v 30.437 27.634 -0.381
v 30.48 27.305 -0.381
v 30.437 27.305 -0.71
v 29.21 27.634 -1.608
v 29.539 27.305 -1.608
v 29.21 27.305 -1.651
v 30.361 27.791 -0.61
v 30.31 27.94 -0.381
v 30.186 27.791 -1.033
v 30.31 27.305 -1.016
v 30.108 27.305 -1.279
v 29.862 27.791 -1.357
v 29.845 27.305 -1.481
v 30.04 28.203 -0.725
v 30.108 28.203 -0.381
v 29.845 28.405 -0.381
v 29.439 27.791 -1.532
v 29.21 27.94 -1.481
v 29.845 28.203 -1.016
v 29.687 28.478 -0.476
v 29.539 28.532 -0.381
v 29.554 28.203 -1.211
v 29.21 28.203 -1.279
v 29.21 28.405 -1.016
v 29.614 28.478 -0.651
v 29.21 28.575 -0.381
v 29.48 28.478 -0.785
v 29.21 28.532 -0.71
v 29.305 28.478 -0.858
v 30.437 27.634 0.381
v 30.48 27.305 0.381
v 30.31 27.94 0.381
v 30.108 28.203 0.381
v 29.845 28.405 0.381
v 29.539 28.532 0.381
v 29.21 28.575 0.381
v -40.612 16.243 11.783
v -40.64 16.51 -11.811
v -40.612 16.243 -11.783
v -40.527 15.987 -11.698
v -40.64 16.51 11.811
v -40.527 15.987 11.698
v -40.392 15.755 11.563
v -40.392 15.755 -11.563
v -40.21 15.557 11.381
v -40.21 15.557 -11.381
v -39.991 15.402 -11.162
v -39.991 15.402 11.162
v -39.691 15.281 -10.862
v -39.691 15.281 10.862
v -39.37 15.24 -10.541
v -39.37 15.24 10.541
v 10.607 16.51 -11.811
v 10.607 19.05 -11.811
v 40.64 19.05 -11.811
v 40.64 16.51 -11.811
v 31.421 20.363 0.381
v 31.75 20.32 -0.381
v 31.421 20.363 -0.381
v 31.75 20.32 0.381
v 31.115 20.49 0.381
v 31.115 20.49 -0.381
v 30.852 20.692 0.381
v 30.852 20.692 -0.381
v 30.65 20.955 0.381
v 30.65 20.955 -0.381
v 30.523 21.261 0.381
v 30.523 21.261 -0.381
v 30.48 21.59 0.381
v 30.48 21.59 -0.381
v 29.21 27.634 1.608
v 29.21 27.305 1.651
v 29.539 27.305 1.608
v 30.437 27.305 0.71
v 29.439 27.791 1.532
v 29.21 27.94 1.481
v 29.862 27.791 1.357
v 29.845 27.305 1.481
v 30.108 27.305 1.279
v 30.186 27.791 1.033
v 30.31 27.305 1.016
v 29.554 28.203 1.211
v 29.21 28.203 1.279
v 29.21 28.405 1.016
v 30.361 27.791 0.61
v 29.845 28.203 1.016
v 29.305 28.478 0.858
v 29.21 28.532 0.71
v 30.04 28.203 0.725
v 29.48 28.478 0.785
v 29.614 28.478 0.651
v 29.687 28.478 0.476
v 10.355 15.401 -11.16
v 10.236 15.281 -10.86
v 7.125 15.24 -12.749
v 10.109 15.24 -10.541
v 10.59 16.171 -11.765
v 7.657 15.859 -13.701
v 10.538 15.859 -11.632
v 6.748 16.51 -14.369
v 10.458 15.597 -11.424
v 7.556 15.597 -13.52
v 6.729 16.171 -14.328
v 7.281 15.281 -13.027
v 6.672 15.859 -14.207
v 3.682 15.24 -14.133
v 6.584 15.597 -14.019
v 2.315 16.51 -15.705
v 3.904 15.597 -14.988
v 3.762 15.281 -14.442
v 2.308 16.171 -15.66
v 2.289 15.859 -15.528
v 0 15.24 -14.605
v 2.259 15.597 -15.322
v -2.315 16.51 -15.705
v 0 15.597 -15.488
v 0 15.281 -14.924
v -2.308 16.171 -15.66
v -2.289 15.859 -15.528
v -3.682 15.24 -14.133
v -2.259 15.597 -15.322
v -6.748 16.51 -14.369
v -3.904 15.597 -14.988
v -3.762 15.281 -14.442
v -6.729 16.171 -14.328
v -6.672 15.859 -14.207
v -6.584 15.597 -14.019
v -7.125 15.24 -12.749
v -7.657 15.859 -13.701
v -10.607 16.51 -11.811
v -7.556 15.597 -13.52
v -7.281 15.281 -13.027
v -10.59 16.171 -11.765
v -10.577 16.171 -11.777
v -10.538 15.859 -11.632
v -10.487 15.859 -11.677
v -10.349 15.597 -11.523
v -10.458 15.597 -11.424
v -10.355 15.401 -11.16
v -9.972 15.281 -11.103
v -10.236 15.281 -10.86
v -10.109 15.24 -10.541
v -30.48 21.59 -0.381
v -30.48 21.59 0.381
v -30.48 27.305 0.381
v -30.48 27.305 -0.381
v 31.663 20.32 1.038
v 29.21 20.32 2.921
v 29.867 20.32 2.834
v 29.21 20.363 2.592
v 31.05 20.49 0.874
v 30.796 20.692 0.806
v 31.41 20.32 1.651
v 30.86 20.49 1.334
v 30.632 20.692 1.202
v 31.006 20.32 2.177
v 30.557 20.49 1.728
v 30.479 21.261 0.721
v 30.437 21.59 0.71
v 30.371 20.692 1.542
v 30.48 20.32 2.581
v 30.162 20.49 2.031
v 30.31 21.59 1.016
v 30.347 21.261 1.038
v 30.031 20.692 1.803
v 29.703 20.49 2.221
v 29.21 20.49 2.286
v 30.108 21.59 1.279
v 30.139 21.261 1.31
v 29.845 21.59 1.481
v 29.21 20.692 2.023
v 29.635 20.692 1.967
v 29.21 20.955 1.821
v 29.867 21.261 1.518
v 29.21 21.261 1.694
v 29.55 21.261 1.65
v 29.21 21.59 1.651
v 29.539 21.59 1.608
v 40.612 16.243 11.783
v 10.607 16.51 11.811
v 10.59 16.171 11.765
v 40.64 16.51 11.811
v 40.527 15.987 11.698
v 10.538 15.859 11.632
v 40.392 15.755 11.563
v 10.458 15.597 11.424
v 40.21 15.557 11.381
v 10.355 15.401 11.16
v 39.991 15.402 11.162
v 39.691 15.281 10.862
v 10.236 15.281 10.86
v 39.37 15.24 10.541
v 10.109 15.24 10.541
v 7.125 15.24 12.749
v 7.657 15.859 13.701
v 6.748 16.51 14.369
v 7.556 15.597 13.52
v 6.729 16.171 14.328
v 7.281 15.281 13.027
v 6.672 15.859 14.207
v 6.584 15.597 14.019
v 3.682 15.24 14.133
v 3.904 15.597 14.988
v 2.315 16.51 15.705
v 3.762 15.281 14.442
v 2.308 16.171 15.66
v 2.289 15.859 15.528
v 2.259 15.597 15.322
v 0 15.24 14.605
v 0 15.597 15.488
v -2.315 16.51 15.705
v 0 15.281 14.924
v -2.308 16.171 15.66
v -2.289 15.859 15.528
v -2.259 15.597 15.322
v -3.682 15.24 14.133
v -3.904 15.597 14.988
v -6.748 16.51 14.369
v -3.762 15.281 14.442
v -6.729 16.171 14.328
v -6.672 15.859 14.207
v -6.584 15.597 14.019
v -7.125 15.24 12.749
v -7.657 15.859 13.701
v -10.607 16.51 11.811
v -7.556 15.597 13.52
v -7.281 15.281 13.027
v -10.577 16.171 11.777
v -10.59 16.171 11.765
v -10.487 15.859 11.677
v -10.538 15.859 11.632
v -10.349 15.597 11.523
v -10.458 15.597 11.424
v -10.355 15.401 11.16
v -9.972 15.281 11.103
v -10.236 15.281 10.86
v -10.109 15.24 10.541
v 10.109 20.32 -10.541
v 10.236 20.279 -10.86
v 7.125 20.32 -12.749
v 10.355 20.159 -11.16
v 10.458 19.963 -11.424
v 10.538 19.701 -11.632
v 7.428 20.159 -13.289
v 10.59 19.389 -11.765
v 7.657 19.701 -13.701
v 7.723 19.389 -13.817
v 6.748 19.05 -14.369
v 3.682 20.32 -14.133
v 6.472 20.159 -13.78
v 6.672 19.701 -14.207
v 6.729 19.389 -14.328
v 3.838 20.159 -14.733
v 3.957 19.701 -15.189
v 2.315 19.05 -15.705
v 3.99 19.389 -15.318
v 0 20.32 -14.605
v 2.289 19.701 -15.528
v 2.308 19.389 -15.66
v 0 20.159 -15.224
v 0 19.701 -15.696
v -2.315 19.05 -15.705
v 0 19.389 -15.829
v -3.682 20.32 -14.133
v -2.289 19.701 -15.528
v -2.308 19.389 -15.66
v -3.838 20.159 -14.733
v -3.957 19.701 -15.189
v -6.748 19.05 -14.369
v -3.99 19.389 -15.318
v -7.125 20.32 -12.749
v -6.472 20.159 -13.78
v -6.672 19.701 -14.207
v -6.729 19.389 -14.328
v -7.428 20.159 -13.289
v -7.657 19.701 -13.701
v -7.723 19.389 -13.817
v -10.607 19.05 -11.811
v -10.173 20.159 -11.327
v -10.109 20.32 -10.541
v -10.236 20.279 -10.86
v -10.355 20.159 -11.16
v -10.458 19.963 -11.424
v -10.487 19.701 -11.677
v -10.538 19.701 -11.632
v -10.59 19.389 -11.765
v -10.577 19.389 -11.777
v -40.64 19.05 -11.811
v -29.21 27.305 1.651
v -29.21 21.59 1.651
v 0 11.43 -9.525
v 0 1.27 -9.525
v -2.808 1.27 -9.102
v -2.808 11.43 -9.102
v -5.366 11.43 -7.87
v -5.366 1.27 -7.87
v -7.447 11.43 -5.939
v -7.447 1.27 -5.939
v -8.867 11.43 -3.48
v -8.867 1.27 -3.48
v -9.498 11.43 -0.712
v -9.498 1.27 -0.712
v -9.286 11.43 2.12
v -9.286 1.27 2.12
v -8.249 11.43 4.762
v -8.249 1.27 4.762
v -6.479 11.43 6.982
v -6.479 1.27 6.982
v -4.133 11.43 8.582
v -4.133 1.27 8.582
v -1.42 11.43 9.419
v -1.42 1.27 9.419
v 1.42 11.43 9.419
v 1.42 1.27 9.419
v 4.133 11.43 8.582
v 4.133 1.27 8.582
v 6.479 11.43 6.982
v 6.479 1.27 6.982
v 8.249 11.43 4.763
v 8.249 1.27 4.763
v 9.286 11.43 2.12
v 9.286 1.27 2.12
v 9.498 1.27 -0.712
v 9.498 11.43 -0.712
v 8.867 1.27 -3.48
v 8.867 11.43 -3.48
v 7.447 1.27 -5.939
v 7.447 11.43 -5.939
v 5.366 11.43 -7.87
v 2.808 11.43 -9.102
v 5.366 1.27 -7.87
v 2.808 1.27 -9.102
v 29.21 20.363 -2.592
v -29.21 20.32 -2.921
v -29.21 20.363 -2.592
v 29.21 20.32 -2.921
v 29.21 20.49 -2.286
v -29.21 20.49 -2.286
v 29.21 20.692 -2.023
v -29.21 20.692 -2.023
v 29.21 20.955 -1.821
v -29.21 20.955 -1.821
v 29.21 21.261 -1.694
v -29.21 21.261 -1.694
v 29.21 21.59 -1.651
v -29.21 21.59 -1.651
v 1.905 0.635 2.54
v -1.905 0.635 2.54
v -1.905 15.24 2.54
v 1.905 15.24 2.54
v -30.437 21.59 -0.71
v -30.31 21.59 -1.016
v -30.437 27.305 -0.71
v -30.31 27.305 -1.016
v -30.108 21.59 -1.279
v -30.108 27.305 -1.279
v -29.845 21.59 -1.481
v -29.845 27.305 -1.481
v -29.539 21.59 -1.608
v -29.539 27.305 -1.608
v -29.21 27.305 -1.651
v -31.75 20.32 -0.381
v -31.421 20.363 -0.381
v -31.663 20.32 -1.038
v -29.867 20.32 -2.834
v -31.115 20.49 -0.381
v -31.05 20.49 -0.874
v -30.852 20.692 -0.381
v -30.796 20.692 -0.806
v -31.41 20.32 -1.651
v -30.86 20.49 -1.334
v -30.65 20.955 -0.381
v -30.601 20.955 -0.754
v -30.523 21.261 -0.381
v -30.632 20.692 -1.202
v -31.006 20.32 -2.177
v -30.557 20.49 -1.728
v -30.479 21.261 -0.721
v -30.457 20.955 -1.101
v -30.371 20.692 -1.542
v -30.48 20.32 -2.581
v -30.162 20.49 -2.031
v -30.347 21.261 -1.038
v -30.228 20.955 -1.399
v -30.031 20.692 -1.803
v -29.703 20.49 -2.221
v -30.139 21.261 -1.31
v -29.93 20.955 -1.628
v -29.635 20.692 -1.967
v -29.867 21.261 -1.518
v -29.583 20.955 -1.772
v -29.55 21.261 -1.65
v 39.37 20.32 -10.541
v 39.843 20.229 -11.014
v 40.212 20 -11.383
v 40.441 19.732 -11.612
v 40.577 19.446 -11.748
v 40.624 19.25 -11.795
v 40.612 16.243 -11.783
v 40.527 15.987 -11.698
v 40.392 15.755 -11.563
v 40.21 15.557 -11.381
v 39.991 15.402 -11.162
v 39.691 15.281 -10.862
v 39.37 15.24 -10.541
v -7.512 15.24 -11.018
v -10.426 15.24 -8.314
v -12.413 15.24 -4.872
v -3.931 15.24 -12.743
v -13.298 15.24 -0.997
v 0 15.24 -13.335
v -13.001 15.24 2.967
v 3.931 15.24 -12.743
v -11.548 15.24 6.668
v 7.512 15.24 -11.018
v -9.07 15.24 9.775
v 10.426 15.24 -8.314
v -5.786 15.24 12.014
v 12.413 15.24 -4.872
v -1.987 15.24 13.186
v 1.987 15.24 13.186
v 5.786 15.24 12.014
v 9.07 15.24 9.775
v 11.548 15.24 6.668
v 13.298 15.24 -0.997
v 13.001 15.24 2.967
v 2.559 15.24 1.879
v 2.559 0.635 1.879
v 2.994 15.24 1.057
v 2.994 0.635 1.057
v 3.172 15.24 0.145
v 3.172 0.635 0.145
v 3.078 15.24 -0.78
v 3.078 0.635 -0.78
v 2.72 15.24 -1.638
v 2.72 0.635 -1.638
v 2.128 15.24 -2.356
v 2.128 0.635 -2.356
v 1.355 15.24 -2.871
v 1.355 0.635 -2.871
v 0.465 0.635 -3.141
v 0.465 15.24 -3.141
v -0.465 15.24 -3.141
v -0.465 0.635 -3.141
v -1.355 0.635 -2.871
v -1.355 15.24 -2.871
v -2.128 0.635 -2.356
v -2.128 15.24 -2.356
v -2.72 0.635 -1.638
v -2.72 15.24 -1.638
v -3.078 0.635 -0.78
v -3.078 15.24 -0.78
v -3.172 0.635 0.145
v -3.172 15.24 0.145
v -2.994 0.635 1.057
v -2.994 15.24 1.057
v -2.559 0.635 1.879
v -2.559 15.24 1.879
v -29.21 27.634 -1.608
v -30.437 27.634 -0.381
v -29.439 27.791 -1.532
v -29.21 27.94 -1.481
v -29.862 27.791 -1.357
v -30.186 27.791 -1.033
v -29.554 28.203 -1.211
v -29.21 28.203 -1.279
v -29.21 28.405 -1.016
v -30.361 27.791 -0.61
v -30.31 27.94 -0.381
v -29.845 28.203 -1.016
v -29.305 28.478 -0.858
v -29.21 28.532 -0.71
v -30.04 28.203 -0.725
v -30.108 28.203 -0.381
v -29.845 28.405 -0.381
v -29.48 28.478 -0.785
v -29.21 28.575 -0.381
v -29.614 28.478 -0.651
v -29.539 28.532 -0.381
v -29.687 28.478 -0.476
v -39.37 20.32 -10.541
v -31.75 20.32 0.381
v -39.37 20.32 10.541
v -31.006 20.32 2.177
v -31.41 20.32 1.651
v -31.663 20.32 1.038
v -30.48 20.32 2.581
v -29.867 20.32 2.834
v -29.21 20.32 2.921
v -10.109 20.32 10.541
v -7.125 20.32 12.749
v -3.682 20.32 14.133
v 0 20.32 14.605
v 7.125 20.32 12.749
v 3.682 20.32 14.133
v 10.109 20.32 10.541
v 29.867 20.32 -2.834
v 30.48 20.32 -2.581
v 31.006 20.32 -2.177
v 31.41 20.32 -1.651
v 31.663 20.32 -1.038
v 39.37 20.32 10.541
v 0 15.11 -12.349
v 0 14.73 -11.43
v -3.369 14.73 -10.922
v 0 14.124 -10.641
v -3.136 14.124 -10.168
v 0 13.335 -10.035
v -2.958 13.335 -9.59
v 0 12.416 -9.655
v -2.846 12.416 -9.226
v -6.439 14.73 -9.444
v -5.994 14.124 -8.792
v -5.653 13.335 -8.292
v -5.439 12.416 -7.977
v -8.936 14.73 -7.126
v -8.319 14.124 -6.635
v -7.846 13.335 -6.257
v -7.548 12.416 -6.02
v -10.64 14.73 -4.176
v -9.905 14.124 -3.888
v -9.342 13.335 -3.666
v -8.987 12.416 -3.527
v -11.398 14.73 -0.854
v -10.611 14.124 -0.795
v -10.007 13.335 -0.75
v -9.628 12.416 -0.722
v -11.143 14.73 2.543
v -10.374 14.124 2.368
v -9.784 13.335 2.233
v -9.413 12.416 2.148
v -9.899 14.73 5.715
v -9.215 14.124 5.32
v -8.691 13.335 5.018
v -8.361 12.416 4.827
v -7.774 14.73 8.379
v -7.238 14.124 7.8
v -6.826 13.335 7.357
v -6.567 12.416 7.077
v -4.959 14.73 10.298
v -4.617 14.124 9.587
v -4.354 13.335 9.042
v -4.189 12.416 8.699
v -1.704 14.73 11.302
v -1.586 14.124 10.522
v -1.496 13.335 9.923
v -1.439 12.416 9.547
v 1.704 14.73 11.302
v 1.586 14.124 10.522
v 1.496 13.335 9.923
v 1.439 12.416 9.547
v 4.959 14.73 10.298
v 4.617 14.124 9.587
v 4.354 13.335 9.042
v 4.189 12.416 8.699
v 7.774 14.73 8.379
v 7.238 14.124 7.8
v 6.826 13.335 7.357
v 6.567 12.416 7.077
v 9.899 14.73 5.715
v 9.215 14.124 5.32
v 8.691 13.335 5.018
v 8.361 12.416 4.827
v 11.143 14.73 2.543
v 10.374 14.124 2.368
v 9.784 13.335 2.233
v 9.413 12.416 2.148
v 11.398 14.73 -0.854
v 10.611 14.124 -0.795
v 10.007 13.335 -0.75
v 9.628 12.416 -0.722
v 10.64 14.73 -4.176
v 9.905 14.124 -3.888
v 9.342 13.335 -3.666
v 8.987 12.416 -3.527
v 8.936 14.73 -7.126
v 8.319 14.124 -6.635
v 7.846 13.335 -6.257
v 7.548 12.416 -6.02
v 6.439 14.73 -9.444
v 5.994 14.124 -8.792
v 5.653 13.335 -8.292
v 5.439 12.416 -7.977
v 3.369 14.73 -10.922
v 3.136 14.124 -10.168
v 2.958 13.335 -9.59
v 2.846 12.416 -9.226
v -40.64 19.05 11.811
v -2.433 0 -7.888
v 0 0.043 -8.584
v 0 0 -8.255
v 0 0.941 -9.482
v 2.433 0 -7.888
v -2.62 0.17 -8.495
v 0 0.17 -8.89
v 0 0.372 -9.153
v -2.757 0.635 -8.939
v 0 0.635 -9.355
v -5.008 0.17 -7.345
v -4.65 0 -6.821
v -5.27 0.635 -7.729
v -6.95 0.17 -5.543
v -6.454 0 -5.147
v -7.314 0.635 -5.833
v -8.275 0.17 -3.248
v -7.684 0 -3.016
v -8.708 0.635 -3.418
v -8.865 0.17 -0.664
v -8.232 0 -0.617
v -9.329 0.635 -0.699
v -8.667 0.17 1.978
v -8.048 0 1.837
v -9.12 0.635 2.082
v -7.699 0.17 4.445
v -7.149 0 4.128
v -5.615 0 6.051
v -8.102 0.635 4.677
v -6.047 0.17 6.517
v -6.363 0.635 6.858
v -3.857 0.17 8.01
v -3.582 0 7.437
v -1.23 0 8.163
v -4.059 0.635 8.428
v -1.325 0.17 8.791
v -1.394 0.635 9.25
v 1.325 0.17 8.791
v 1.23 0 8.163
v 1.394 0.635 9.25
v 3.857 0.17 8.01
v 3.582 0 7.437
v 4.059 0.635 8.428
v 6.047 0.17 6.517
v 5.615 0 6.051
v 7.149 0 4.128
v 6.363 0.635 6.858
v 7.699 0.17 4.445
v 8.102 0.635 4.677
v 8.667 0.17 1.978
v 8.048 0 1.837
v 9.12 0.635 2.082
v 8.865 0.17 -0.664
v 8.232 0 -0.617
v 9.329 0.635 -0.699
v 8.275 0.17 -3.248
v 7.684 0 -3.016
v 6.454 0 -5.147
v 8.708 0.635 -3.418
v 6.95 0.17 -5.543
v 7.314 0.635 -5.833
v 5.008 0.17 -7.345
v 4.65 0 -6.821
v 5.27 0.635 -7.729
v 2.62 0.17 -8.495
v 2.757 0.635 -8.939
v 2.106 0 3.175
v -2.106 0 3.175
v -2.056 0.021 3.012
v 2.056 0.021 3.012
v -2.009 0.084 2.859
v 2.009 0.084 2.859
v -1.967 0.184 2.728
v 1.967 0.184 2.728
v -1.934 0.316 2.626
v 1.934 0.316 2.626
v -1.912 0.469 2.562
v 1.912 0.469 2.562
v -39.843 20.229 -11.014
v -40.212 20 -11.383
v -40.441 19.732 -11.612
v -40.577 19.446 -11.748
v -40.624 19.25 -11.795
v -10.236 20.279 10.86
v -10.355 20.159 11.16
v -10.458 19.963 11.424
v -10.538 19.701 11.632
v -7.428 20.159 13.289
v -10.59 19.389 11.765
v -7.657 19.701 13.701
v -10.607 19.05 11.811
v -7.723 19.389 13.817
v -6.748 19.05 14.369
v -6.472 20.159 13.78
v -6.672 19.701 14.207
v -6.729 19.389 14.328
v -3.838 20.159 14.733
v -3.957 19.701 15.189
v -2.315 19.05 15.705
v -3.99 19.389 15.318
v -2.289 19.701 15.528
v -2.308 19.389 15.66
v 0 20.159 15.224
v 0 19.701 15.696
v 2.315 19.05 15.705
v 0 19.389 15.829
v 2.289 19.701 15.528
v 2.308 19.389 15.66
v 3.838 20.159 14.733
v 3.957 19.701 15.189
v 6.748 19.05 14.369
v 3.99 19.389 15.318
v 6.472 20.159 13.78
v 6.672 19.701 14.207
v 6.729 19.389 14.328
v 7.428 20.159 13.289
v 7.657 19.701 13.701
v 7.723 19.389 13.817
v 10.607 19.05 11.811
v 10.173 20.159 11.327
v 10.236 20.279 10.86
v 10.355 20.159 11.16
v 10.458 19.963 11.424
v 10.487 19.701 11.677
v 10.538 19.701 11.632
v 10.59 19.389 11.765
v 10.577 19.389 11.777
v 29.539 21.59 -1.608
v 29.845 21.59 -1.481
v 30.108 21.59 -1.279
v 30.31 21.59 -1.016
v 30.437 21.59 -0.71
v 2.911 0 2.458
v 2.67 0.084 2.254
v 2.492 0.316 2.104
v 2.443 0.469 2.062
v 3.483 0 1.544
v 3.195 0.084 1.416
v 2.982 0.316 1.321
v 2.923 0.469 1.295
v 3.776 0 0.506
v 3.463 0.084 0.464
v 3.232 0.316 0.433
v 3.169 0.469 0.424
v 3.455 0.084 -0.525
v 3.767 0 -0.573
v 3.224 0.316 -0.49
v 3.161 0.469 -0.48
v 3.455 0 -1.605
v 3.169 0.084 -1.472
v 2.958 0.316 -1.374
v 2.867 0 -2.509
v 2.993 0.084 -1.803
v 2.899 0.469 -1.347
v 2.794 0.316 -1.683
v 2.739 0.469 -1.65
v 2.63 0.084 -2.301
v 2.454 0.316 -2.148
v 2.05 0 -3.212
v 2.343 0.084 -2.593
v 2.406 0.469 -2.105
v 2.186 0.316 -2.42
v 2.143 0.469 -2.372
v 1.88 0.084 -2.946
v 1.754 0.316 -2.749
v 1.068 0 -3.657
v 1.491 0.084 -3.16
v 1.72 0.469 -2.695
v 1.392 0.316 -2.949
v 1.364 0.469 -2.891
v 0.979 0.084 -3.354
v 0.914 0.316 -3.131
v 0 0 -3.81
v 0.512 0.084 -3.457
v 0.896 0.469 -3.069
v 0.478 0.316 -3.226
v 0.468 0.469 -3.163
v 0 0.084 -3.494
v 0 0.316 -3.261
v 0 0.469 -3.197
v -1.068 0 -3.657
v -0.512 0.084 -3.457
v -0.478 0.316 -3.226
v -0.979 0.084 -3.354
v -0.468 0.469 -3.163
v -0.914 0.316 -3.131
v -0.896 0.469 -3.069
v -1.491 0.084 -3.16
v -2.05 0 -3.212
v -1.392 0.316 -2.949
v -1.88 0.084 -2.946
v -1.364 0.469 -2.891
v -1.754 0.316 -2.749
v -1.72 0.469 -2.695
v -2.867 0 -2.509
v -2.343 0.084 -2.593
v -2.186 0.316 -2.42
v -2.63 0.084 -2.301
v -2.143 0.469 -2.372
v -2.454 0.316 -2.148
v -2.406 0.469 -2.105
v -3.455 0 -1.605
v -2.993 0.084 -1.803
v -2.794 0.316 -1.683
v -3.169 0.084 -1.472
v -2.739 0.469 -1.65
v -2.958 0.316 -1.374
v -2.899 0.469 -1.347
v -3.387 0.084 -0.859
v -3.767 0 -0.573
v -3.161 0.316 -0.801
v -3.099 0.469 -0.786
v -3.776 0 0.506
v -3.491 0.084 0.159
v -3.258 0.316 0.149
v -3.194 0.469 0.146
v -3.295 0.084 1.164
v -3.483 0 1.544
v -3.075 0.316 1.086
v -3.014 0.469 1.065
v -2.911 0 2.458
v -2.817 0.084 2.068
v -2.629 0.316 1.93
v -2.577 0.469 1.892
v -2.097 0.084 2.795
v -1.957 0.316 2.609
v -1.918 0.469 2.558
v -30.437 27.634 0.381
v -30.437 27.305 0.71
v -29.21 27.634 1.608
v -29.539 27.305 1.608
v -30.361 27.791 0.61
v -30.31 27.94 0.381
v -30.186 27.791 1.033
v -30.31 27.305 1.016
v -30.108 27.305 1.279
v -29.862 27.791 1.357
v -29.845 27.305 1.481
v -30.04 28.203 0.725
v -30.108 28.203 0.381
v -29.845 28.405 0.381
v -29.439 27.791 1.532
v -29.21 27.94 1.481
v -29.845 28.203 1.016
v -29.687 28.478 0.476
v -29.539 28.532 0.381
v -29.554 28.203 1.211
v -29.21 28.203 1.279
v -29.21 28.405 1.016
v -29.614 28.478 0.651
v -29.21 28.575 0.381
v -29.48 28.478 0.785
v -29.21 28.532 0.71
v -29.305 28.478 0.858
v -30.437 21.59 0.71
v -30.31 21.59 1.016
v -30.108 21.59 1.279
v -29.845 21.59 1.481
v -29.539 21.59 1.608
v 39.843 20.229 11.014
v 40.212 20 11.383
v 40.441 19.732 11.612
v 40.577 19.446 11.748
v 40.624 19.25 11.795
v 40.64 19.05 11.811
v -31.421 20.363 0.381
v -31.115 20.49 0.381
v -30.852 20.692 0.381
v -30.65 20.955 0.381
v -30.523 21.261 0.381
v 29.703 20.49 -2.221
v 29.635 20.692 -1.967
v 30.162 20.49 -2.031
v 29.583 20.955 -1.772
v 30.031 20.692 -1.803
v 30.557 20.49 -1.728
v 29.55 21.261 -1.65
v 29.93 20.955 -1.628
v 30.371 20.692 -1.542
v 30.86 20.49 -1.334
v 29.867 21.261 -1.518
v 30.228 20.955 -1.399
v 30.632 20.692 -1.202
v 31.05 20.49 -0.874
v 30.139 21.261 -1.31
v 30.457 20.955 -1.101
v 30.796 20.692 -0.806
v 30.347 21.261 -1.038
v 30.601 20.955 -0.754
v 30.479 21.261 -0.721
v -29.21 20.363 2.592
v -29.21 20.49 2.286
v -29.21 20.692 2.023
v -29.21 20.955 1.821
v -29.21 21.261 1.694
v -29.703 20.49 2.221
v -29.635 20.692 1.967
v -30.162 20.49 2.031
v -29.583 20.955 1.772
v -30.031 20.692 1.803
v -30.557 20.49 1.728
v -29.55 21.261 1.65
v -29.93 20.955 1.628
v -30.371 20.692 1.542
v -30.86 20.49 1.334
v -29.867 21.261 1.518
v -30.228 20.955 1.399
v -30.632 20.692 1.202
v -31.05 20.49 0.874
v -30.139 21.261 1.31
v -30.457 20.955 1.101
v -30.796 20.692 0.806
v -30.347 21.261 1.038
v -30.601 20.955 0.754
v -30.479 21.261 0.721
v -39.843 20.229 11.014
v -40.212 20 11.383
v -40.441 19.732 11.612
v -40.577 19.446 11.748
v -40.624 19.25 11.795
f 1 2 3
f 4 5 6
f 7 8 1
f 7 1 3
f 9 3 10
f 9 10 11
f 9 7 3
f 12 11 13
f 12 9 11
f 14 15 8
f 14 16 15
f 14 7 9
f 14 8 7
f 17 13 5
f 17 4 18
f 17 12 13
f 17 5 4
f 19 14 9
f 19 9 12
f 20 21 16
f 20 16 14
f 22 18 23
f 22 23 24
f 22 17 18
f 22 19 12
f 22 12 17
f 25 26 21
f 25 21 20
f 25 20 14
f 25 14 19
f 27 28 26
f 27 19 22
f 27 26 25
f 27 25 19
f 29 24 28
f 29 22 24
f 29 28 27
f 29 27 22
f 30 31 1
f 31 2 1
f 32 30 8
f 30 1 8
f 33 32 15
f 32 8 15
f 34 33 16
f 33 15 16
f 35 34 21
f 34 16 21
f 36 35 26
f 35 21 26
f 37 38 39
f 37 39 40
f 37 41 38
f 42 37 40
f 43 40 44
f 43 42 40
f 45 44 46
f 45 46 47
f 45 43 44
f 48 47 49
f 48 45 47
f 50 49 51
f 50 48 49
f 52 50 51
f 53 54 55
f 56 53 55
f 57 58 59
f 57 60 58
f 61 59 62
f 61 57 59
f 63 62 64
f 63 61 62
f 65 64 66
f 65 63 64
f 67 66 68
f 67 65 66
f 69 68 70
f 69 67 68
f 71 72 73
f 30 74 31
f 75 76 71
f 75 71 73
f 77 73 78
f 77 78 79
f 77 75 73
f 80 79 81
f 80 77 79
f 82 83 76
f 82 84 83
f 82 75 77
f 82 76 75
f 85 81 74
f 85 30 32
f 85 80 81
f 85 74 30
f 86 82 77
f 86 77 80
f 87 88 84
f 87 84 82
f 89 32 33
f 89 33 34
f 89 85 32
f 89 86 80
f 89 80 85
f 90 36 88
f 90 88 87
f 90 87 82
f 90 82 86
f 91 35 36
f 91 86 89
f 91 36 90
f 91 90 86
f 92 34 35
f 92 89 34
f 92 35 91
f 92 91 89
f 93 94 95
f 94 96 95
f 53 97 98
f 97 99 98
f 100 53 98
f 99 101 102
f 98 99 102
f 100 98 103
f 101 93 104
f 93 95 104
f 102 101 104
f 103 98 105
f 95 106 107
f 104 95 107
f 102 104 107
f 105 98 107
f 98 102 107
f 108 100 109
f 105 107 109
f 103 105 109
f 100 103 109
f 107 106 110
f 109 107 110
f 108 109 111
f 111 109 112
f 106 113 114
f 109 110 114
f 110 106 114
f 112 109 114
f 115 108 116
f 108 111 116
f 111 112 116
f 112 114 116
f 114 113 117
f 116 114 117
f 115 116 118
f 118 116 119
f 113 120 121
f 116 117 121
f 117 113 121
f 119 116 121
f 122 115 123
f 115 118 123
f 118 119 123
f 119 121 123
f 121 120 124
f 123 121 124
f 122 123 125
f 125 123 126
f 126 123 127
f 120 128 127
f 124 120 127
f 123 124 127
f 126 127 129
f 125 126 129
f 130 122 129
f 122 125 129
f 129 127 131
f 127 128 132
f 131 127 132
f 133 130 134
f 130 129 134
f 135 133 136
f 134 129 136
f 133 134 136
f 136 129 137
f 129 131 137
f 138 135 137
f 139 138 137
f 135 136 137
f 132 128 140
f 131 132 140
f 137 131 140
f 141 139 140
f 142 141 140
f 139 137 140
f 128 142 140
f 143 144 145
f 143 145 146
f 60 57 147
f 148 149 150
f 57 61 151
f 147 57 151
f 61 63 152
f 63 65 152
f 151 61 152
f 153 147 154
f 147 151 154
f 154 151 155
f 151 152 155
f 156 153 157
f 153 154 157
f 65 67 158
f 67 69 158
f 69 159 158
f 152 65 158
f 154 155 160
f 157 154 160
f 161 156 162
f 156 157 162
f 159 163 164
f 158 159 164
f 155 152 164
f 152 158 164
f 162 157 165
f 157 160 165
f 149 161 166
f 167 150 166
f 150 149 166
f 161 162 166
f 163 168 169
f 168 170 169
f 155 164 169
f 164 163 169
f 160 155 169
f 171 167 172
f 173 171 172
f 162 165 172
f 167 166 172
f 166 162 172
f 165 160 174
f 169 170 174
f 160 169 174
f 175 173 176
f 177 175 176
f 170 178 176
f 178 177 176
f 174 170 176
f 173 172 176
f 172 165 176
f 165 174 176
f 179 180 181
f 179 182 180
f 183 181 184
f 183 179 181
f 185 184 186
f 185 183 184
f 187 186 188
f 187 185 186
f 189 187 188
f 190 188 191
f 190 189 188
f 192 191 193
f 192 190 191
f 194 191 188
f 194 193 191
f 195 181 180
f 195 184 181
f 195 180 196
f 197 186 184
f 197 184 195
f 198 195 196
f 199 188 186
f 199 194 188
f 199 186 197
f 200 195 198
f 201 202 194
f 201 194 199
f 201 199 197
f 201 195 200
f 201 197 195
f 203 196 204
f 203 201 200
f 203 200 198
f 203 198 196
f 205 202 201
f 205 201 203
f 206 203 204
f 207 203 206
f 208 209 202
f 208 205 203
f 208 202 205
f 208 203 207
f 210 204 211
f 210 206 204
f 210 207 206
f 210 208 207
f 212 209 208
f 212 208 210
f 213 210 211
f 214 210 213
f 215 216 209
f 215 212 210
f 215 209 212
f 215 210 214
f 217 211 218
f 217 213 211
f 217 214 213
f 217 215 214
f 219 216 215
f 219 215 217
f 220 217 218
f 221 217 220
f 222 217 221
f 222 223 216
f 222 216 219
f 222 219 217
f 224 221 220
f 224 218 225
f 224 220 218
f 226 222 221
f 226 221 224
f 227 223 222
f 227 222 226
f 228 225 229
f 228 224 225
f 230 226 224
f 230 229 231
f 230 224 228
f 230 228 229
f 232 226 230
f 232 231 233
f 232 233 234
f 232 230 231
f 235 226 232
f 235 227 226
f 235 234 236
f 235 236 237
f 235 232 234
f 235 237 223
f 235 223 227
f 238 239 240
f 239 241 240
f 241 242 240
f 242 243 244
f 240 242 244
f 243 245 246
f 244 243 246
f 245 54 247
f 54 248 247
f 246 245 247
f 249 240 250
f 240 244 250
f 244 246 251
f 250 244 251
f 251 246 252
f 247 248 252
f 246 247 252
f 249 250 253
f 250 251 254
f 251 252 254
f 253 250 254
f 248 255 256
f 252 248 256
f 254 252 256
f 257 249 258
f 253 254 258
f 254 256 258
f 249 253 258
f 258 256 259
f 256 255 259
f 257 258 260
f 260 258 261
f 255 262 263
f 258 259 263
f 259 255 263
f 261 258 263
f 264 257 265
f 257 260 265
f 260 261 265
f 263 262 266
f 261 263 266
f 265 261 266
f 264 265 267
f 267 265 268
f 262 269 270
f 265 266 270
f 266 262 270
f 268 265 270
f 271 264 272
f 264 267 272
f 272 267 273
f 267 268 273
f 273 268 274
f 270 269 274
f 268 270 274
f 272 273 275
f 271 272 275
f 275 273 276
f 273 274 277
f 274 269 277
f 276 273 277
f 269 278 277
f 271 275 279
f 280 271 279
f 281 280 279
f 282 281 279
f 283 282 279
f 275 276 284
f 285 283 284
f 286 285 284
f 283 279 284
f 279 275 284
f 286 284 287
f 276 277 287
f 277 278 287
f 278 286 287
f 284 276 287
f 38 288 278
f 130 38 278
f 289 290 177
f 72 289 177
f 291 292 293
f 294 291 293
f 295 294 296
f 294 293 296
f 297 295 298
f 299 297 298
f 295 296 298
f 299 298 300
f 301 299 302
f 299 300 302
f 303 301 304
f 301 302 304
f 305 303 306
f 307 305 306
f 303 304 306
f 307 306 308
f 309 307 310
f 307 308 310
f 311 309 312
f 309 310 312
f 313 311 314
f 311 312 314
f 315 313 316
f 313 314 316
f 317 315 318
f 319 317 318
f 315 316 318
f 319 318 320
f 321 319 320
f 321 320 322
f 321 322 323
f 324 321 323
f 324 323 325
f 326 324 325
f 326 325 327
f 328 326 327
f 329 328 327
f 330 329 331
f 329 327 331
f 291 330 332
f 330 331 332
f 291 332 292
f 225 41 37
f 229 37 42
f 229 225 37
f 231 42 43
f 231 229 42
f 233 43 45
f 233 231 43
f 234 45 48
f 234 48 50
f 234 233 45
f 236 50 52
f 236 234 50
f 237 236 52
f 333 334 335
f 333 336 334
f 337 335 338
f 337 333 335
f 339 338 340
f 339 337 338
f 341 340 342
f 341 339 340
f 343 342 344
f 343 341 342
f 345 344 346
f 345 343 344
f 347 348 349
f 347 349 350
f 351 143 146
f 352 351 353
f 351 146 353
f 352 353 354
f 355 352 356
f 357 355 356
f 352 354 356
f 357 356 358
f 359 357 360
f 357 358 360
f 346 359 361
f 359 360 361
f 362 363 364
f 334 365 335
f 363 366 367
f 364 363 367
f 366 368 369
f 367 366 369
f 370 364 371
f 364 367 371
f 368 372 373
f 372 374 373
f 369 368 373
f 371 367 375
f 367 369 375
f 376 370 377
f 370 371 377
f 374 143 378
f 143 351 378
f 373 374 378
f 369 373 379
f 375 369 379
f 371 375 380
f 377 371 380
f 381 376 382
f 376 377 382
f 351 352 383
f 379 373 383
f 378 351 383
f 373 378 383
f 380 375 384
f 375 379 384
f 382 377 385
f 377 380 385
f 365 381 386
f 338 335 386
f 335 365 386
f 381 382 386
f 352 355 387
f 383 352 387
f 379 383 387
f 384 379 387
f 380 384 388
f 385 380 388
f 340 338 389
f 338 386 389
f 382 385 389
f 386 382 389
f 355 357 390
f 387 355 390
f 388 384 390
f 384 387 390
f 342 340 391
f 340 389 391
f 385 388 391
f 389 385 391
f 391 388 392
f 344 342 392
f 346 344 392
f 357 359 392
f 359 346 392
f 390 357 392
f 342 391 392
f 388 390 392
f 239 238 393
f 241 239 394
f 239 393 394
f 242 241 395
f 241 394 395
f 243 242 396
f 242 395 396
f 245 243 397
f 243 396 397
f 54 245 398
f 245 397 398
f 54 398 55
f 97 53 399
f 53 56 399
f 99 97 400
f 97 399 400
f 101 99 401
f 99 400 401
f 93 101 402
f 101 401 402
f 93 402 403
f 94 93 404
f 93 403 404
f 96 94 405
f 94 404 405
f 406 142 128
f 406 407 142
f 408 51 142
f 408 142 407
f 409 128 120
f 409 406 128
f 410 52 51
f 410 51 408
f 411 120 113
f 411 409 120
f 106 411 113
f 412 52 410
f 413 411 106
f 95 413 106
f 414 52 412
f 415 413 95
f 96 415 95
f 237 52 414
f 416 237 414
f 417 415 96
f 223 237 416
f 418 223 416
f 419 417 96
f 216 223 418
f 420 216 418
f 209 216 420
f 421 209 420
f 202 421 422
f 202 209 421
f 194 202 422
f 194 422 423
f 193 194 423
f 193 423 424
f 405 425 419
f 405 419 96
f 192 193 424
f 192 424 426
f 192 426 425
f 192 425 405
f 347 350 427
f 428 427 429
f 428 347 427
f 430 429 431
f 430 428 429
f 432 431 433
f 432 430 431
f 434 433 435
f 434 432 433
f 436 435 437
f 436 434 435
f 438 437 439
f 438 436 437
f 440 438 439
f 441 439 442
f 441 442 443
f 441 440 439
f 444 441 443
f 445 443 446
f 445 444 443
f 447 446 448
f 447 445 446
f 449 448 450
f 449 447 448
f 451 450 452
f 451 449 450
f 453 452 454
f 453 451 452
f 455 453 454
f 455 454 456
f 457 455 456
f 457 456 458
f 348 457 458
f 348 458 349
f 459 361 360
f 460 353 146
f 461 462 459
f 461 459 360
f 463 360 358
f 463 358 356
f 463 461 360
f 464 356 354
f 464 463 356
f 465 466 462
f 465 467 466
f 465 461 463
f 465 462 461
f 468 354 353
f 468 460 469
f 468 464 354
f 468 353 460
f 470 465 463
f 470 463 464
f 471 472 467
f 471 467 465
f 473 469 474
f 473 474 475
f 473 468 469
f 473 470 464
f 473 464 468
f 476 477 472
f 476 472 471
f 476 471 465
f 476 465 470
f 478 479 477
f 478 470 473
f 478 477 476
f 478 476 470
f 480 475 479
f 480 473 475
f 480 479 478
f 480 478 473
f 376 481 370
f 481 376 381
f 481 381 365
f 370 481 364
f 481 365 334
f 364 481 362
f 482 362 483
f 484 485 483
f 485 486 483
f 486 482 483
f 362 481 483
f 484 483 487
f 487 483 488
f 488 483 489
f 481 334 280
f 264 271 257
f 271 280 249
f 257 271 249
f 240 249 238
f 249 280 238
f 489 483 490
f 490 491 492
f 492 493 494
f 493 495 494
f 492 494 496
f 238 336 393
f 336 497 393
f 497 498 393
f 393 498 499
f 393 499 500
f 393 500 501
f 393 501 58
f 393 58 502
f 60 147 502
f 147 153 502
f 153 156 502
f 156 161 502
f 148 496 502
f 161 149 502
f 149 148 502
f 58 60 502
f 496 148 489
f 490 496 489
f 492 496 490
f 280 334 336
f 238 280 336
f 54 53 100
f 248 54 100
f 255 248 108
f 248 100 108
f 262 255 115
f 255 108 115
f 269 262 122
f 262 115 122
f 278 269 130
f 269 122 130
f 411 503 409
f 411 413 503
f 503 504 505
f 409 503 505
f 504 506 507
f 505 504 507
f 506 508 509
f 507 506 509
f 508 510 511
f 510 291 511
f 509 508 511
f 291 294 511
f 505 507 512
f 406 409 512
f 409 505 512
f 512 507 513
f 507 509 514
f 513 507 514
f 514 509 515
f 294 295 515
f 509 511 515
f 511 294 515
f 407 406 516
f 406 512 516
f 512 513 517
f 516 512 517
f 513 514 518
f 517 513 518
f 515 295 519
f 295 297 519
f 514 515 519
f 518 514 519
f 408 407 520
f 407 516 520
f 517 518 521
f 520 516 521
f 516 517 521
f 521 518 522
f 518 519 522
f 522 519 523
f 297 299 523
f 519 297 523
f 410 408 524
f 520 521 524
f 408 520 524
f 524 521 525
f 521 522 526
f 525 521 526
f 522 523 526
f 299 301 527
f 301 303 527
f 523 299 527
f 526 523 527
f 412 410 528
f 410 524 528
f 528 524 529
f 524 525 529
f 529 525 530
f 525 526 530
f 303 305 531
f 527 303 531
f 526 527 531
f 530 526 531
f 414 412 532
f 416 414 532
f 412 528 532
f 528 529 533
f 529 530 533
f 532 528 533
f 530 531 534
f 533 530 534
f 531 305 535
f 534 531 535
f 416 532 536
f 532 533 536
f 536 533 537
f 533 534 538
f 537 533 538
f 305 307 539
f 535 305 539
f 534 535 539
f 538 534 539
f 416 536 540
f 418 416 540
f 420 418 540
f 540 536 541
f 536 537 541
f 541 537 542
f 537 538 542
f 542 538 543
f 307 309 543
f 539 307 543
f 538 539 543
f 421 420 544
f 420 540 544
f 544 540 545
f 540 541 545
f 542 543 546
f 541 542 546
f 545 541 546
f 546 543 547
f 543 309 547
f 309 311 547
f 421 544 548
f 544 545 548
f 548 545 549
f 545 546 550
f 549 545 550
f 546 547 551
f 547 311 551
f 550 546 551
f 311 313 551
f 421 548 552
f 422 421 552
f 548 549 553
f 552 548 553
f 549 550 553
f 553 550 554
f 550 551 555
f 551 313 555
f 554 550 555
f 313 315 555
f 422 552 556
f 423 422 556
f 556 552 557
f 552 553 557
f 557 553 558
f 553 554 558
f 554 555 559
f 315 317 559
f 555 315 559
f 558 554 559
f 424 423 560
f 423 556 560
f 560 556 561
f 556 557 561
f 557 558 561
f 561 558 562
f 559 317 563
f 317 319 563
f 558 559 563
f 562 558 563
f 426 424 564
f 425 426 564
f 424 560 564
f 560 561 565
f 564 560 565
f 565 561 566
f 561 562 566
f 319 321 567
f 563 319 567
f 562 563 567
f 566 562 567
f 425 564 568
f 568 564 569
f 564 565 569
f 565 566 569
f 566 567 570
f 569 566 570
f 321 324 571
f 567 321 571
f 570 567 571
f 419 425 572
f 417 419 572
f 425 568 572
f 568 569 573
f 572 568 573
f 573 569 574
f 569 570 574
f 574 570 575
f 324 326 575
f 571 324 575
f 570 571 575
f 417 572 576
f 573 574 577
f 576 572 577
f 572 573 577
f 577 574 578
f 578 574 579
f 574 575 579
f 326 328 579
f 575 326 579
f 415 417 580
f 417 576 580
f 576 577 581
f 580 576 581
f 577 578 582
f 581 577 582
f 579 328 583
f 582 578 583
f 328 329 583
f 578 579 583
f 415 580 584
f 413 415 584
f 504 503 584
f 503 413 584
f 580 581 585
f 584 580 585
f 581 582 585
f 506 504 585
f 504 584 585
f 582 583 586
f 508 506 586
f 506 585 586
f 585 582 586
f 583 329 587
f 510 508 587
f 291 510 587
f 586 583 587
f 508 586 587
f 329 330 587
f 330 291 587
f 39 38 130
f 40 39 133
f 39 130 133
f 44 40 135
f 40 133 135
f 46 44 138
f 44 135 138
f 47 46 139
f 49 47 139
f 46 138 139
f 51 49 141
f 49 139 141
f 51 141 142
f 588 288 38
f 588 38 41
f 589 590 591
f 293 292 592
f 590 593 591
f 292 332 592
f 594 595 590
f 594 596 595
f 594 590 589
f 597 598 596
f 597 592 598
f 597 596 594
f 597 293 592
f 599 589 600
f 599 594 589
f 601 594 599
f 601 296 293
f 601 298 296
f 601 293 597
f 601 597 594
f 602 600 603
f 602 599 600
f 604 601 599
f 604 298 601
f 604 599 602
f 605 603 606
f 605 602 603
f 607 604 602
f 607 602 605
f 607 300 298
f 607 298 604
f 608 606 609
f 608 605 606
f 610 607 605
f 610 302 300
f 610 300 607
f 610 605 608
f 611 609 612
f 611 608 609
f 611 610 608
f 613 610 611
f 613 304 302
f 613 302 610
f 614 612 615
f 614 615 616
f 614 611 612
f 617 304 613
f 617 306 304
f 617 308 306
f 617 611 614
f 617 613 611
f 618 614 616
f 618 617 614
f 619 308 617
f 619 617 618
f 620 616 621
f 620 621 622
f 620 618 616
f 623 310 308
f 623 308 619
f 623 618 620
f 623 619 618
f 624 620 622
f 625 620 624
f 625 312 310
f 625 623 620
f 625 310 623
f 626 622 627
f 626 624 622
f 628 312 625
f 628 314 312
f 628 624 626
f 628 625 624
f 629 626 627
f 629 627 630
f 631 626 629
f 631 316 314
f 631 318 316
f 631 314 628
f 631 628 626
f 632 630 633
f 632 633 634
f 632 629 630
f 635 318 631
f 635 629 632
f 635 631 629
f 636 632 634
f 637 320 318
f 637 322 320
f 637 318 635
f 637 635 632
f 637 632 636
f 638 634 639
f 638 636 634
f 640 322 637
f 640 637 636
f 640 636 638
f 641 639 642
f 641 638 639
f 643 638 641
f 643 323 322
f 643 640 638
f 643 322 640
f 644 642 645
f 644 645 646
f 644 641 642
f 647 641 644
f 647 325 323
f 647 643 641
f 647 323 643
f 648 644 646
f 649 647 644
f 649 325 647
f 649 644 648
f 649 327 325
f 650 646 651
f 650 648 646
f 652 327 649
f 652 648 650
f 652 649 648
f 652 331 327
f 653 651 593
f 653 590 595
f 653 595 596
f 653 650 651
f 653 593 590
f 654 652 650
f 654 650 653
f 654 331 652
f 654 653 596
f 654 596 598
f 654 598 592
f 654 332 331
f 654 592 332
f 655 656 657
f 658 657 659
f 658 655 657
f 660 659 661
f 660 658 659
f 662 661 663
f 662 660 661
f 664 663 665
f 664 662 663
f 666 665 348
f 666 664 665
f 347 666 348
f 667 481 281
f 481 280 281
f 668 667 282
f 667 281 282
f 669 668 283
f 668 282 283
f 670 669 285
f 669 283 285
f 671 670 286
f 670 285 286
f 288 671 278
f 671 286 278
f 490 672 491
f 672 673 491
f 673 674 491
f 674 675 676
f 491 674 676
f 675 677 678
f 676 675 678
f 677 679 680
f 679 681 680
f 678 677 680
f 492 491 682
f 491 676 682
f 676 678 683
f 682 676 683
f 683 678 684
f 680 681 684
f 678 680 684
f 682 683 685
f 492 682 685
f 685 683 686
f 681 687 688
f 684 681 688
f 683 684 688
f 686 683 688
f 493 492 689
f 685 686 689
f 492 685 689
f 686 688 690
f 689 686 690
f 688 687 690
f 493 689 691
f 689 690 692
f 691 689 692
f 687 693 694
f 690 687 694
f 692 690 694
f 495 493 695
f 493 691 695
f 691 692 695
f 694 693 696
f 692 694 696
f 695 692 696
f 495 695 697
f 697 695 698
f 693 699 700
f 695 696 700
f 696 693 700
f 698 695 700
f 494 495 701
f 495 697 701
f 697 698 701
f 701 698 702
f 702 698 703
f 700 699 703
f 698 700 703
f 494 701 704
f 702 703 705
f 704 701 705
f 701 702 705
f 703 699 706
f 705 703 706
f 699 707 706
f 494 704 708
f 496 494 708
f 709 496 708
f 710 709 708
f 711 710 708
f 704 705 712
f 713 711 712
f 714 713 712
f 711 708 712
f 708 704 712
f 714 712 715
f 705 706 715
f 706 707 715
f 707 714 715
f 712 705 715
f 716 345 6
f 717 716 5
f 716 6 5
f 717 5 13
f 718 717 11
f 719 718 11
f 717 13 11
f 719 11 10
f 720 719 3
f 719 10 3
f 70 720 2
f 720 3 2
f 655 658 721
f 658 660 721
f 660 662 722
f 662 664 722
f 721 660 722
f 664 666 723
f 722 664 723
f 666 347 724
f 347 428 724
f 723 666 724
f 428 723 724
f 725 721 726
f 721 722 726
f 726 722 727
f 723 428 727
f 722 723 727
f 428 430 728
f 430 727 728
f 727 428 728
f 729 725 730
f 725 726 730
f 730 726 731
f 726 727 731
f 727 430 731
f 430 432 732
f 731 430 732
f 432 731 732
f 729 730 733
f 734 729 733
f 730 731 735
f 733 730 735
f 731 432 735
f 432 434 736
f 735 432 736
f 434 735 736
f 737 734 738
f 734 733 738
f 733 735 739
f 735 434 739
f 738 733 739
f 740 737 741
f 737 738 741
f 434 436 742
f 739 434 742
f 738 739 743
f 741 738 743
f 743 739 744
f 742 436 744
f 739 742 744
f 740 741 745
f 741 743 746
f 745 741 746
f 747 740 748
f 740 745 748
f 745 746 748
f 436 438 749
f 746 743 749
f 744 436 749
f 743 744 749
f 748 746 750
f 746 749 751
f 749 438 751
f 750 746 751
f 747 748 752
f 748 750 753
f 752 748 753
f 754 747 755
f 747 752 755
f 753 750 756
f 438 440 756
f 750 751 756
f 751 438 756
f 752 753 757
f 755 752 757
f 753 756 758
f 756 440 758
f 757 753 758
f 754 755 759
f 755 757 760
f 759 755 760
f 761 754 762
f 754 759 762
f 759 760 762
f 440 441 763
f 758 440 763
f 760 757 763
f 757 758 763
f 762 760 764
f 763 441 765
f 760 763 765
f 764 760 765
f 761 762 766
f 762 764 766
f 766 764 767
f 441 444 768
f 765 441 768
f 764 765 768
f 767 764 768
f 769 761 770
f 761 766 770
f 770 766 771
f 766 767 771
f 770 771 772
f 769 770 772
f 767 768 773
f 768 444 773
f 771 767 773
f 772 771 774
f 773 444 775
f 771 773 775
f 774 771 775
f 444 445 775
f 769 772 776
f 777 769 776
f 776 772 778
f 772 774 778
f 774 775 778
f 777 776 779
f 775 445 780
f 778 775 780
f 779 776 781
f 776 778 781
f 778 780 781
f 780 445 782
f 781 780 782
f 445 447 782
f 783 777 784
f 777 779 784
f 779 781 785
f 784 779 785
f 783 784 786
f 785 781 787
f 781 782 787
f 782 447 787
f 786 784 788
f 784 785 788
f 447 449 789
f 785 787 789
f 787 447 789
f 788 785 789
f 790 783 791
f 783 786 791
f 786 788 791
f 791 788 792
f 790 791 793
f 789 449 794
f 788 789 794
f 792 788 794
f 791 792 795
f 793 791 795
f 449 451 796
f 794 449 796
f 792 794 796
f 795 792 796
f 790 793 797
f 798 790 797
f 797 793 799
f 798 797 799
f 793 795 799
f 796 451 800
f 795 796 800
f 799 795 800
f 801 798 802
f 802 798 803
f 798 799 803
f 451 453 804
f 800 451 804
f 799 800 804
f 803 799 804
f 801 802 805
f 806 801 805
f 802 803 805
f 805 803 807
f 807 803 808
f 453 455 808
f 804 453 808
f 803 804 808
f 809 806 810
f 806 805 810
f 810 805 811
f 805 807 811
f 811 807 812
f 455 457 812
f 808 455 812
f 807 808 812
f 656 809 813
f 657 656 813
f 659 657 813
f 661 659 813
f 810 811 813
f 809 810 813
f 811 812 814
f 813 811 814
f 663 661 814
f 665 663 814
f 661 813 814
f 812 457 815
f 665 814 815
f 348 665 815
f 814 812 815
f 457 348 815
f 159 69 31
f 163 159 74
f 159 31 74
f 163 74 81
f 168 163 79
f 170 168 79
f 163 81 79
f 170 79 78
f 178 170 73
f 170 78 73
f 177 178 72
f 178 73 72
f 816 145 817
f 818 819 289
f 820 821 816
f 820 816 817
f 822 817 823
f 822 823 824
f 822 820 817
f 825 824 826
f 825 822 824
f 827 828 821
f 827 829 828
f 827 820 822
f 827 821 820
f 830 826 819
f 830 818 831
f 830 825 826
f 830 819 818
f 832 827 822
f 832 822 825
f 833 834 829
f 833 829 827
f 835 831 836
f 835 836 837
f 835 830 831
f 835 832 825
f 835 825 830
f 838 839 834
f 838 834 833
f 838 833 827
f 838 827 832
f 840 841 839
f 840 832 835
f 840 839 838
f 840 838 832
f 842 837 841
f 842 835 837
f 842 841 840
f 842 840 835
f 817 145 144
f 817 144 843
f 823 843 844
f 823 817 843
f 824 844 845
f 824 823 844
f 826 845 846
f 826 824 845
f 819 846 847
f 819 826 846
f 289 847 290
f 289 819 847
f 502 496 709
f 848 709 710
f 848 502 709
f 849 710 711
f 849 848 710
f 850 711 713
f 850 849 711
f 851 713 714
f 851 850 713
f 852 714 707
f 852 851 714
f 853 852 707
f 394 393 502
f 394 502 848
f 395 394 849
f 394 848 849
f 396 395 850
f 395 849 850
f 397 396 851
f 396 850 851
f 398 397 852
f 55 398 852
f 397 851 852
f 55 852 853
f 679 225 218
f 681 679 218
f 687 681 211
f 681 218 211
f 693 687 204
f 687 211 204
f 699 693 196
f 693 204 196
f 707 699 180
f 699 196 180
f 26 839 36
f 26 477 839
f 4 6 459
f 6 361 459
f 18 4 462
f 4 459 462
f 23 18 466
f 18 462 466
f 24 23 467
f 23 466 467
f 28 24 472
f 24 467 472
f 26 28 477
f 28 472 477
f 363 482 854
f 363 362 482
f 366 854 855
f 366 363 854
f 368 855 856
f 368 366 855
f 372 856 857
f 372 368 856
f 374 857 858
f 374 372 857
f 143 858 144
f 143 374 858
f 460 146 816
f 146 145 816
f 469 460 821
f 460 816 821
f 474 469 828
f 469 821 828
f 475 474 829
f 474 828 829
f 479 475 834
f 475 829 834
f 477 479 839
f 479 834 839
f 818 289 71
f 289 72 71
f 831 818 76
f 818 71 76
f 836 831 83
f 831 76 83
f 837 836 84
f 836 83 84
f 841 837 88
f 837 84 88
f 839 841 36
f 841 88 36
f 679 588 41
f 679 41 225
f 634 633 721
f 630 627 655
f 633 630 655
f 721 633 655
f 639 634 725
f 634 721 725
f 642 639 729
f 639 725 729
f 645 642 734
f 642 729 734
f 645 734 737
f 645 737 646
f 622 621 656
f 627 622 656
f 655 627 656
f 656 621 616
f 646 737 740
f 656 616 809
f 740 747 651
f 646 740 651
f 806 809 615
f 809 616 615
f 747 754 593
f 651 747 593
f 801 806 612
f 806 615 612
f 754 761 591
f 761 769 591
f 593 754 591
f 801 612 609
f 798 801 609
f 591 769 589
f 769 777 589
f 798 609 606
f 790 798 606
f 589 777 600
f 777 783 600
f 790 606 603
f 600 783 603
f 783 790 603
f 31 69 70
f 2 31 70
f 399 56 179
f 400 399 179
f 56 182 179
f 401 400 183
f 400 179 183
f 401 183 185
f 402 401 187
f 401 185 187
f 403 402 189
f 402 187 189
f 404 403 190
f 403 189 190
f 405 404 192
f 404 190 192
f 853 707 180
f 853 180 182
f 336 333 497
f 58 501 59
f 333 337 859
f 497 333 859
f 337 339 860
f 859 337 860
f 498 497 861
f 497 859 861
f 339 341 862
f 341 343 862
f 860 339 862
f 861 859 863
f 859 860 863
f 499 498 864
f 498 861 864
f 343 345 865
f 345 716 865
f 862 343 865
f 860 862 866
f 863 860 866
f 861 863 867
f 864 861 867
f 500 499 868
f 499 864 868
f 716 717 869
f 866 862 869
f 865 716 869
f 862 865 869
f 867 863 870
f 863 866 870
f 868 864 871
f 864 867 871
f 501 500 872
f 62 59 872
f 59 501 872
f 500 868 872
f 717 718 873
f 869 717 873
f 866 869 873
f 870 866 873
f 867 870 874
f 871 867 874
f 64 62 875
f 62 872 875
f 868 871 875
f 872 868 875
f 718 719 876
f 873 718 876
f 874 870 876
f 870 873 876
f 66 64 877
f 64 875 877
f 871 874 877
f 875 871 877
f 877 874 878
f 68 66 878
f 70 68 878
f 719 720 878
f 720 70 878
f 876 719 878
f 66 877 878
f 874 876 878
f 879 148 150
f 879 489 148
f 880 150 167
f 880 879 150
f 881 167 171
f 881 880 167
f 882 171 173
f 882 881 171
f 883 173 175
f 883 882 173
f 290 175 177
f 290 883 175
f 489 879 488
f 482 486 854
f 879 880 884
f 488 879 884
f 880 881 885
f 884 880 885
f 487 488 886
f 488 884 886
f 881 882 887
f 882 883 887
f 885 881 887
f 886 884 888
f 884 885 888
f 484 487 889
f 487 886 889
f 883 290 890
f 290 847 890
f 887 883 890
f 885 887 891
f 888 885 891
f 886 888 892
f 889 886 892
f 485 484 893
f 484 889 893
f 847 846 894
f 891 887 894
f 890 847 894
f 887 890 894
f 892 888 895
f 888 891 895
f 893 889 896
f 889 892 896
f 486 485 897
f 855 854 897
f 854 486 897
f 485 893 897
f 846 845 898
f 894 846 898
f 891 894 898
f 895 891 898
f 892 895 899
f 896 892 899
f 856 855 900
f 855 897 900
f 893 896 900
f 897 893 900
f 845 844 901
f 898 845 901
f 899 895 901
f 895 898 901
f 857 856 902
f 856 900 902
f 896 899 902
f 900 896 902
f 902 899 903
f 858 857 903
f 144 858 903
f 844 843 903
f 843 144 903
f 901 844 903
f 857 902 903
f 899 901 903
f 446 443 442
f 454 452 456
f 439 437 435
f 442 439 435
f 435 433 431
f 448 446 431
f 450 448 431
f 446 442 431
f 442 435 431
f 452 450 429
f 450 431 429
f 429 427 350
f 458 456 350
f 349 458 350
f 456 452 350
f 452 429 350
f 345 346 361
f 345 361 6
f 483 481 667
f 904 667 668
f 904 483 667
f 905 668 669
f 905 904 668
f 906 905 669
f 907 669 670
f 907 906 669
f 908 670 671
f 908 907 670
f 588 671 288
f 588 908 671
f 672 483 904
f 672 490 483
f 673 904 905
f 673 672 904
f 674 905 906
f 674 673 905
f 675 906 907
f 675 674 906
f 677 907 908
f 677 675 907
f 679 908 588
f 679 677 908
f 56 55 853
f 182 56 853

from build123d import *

# Parameters (mm, degrees)
SKETCH1_R           = 9.525
SKETCH1_R_2         = 3.175
BOSS_EXTRUDE1_DEPTH = 15.24
SKETCH2_R           = 15.875
SKETCH2_R_2         = 1.5875
BOSS_EXTRUDE2_DEPTH = 5.08
SKETCH3_W           = 60.96
SKETCH3_H           = 3.302
BOSS_EXTRUDE3_DEPTH = 8.255
SKETCH4_W           = 81.28
SKETCH4_H           = 23.622
BOSS_EXTRUDE4_DEPTH = 5.08
BOSS_EXTRUDE5_REACH = 54.155
FILLET1_R           = 1.27
FILLET2_R           = 1.27
FILLET3_R           = 1.27
FILLET4_R           = 1.27
FILLET5_R           = 3.81
FILLET6_R           = 0.635
FILLET7_R           = 1.27
FILLET8_R           = 1.27


with BuildPart() as part:
    # Sketch1 → Boss-Extrude1 (new body)
    with BuildSketch(Plane(origin=(0, 0, 0), x_dir=(1, 0, 0), z_dir=(0, 1, 0))):
        with Locations(Location((0, 0, 0), (0, 0, 90))):
            Circle(SKETCH1_R)
        with Locations(Location((0, 0, 0), (0, 0, 90))):
            Circle(SKETCH1_R_2, mode=Mode.SUBTRACT)
    extrude(amount=BOSS_EXTRUDE1_DEPTH)

    # Sketch2 → Boss-Extrude2 (add)
    with BuildSketch(Plane(origin=(0, 15.24, 0), x_dir=(1, 0, 0), z_dir=(0, 1, 0))):
        with Locations(Location((0, 0, 0), (0, 0, 270))):
            Circle(SKETCH2_R)
        with Locations(Location((0, 0, 0), (0, 0, 270))):
            Circle(SKETCH2_R_2, mode=Mode.SUBTRACT)
    extrude(amount=BOSS_EXTRUDE2_DEPTH)

    # Sketch3 → Boss-Extrude3 (add)
    with BuildSketch(Plane(origin=(0, 20.32, 0), x_dir=(1, 0, 0), z_dir=(0, 1, 0))):
        Rectangle(SKETCH3_W, SKETCH3_H)
    extrude(amount=BOSS_EXTRUDE3_DEPTH)

    # Sketch4 → Boss-Extrude4 (add)
    with BuildSketch(Plane.XZ.offset(-20.32)):
        Rectangle(SKETCH4_W, SKETCH4_H)
    extrude(amount=BOSS_EXTRUDE4_DEPTH)

    # Sketch5 → Boss-Extrude5 (add, up to next)
    with BuildSketch(Plane.XZ, mode=Mode.PRIVATE) as boss_extrude5_sk1:
        with BuildLine():
            ThreePointArc((1.905, 2.54), (0, 3.175), (-1.905, 2.54))
            Line((-1.905, 2.54), (1.905, 2.54))
        make_face()
    boss_extrude5_tool1 = extrude(boss_extrude5_sk1.sketch, amount=-BOSS_EXTRUDE5_REACH, mode=Mode.PRIVATE) - part.part
    add(boss_extrude5_tool1.solids().sort_by_distance((0, 0, 2.796311))[0])

    # Fillet1
    fillet1_edges = [part.edges().sort_by_distance(p)[0] for p in [
        (30.48, 24.4475, 1.651),
        (30.48, 24.4475, -1.651),
        (-30.48, 24.4475, -1.651),
        (-30.48, 24.4475, 1.651),
    ]]
    fillet(fillet1_edges, radius=FILLET1_R)

    # Fillet2
    fillet2_edges = [part.edges().sort_by_distance(p)[0] for p in [
        (0, 28.575, 1.651),
        (-30.48, 28.575, 0),
        (30.48, 28.575, 0),
        (0, 28.575, -1.651),
        (30.108025612, 28.575, 1.279025612),
        (30.108025612, 28.575, -1.279025612),
        (-30.108025612, 28.575, -1.279025612),
        (-30.108025612, 28.575, 1.279025612),
    ]]
    fillet(fillet2_edges, radius=FILLET2_R)

    # Fillet3
    fillet3_edges = [part.edges().sort_by_distance(p)[0] for p in [
        (0, 20.32, 15.875),
        (0, 20.32, -15.875),
        (25.623675707, 20.32, 11.811),
        (-25.623675707, 20.32, 11.811),
        (-25.623675707, 20.32, -11.811),
        (25.623675707, 20.32, -11.811),
        (40.64, 20.32, 0),
        (-40.64, 20.32, 0),
    ]]
    fillet(fillet3_edges, radius=FILLET3_R)

    # Fillet4
    fillet4_edges = [part.edges().sort_by_distance(p)[0] for p in [
        (0, 15.24, -15.875),
        (0, 15.24, 15.875),
        (25.623675707, 15.24, -11.811),
        (40.64, 15.24, 0),
        (25.623675707, 15.24, 11.811),
        (-25.623675707, 15.24, 11.811),
        (-40.64, 15.24, 0),
        (-25.623675707, 15.24, -11.811),
    ]]
    fillet(fillet4_edges, radius=FILLET4_R)

    # Fillet5
    fillet5_edges = [part.edges().sort_by_distance(p)[0] for p in [
        (0, 15.24, 9.525),
    ]]
    fillet(fillet5_edges, radius=FILLET5_R)

    # Fillet6
    fillet6_edges = [part.edges().sort_by_distance(p)[0] for p in [
        (0, 0, -3.175),
        (0, 0, 2.54),
    ]]
    fillet(fillet6_edges, radius=FILLET6_R)

    # Fillet7
    fillet7_edges = [part.edges().sort_by_distance(p)[0] for p in [
        (0, 0, 9.525),
    ]]
    fillet(fillet7_edges, radius=FILLET7_R)

    # Fillet8
    fillet8_edges = [part.edges().sort_by_distance(p)[0] for p in [
        (0, 20.32, 1.651),
        (-30.48, 20.32, 0),
        (0, 20.32, -1.651),
        (30.48, 20.32, 0),
        (-30.108025612, 20.32, 1.279025612),
        (-30.108025612, 20.32, -1.279025612),
        (30.108025612, 20.32, -1.279025612),
        (30.108025612, 20.32, 1.279025612),
    ]]
    fillet(fillet8_edges, radius=FILLET8_R)


solid = part.part
